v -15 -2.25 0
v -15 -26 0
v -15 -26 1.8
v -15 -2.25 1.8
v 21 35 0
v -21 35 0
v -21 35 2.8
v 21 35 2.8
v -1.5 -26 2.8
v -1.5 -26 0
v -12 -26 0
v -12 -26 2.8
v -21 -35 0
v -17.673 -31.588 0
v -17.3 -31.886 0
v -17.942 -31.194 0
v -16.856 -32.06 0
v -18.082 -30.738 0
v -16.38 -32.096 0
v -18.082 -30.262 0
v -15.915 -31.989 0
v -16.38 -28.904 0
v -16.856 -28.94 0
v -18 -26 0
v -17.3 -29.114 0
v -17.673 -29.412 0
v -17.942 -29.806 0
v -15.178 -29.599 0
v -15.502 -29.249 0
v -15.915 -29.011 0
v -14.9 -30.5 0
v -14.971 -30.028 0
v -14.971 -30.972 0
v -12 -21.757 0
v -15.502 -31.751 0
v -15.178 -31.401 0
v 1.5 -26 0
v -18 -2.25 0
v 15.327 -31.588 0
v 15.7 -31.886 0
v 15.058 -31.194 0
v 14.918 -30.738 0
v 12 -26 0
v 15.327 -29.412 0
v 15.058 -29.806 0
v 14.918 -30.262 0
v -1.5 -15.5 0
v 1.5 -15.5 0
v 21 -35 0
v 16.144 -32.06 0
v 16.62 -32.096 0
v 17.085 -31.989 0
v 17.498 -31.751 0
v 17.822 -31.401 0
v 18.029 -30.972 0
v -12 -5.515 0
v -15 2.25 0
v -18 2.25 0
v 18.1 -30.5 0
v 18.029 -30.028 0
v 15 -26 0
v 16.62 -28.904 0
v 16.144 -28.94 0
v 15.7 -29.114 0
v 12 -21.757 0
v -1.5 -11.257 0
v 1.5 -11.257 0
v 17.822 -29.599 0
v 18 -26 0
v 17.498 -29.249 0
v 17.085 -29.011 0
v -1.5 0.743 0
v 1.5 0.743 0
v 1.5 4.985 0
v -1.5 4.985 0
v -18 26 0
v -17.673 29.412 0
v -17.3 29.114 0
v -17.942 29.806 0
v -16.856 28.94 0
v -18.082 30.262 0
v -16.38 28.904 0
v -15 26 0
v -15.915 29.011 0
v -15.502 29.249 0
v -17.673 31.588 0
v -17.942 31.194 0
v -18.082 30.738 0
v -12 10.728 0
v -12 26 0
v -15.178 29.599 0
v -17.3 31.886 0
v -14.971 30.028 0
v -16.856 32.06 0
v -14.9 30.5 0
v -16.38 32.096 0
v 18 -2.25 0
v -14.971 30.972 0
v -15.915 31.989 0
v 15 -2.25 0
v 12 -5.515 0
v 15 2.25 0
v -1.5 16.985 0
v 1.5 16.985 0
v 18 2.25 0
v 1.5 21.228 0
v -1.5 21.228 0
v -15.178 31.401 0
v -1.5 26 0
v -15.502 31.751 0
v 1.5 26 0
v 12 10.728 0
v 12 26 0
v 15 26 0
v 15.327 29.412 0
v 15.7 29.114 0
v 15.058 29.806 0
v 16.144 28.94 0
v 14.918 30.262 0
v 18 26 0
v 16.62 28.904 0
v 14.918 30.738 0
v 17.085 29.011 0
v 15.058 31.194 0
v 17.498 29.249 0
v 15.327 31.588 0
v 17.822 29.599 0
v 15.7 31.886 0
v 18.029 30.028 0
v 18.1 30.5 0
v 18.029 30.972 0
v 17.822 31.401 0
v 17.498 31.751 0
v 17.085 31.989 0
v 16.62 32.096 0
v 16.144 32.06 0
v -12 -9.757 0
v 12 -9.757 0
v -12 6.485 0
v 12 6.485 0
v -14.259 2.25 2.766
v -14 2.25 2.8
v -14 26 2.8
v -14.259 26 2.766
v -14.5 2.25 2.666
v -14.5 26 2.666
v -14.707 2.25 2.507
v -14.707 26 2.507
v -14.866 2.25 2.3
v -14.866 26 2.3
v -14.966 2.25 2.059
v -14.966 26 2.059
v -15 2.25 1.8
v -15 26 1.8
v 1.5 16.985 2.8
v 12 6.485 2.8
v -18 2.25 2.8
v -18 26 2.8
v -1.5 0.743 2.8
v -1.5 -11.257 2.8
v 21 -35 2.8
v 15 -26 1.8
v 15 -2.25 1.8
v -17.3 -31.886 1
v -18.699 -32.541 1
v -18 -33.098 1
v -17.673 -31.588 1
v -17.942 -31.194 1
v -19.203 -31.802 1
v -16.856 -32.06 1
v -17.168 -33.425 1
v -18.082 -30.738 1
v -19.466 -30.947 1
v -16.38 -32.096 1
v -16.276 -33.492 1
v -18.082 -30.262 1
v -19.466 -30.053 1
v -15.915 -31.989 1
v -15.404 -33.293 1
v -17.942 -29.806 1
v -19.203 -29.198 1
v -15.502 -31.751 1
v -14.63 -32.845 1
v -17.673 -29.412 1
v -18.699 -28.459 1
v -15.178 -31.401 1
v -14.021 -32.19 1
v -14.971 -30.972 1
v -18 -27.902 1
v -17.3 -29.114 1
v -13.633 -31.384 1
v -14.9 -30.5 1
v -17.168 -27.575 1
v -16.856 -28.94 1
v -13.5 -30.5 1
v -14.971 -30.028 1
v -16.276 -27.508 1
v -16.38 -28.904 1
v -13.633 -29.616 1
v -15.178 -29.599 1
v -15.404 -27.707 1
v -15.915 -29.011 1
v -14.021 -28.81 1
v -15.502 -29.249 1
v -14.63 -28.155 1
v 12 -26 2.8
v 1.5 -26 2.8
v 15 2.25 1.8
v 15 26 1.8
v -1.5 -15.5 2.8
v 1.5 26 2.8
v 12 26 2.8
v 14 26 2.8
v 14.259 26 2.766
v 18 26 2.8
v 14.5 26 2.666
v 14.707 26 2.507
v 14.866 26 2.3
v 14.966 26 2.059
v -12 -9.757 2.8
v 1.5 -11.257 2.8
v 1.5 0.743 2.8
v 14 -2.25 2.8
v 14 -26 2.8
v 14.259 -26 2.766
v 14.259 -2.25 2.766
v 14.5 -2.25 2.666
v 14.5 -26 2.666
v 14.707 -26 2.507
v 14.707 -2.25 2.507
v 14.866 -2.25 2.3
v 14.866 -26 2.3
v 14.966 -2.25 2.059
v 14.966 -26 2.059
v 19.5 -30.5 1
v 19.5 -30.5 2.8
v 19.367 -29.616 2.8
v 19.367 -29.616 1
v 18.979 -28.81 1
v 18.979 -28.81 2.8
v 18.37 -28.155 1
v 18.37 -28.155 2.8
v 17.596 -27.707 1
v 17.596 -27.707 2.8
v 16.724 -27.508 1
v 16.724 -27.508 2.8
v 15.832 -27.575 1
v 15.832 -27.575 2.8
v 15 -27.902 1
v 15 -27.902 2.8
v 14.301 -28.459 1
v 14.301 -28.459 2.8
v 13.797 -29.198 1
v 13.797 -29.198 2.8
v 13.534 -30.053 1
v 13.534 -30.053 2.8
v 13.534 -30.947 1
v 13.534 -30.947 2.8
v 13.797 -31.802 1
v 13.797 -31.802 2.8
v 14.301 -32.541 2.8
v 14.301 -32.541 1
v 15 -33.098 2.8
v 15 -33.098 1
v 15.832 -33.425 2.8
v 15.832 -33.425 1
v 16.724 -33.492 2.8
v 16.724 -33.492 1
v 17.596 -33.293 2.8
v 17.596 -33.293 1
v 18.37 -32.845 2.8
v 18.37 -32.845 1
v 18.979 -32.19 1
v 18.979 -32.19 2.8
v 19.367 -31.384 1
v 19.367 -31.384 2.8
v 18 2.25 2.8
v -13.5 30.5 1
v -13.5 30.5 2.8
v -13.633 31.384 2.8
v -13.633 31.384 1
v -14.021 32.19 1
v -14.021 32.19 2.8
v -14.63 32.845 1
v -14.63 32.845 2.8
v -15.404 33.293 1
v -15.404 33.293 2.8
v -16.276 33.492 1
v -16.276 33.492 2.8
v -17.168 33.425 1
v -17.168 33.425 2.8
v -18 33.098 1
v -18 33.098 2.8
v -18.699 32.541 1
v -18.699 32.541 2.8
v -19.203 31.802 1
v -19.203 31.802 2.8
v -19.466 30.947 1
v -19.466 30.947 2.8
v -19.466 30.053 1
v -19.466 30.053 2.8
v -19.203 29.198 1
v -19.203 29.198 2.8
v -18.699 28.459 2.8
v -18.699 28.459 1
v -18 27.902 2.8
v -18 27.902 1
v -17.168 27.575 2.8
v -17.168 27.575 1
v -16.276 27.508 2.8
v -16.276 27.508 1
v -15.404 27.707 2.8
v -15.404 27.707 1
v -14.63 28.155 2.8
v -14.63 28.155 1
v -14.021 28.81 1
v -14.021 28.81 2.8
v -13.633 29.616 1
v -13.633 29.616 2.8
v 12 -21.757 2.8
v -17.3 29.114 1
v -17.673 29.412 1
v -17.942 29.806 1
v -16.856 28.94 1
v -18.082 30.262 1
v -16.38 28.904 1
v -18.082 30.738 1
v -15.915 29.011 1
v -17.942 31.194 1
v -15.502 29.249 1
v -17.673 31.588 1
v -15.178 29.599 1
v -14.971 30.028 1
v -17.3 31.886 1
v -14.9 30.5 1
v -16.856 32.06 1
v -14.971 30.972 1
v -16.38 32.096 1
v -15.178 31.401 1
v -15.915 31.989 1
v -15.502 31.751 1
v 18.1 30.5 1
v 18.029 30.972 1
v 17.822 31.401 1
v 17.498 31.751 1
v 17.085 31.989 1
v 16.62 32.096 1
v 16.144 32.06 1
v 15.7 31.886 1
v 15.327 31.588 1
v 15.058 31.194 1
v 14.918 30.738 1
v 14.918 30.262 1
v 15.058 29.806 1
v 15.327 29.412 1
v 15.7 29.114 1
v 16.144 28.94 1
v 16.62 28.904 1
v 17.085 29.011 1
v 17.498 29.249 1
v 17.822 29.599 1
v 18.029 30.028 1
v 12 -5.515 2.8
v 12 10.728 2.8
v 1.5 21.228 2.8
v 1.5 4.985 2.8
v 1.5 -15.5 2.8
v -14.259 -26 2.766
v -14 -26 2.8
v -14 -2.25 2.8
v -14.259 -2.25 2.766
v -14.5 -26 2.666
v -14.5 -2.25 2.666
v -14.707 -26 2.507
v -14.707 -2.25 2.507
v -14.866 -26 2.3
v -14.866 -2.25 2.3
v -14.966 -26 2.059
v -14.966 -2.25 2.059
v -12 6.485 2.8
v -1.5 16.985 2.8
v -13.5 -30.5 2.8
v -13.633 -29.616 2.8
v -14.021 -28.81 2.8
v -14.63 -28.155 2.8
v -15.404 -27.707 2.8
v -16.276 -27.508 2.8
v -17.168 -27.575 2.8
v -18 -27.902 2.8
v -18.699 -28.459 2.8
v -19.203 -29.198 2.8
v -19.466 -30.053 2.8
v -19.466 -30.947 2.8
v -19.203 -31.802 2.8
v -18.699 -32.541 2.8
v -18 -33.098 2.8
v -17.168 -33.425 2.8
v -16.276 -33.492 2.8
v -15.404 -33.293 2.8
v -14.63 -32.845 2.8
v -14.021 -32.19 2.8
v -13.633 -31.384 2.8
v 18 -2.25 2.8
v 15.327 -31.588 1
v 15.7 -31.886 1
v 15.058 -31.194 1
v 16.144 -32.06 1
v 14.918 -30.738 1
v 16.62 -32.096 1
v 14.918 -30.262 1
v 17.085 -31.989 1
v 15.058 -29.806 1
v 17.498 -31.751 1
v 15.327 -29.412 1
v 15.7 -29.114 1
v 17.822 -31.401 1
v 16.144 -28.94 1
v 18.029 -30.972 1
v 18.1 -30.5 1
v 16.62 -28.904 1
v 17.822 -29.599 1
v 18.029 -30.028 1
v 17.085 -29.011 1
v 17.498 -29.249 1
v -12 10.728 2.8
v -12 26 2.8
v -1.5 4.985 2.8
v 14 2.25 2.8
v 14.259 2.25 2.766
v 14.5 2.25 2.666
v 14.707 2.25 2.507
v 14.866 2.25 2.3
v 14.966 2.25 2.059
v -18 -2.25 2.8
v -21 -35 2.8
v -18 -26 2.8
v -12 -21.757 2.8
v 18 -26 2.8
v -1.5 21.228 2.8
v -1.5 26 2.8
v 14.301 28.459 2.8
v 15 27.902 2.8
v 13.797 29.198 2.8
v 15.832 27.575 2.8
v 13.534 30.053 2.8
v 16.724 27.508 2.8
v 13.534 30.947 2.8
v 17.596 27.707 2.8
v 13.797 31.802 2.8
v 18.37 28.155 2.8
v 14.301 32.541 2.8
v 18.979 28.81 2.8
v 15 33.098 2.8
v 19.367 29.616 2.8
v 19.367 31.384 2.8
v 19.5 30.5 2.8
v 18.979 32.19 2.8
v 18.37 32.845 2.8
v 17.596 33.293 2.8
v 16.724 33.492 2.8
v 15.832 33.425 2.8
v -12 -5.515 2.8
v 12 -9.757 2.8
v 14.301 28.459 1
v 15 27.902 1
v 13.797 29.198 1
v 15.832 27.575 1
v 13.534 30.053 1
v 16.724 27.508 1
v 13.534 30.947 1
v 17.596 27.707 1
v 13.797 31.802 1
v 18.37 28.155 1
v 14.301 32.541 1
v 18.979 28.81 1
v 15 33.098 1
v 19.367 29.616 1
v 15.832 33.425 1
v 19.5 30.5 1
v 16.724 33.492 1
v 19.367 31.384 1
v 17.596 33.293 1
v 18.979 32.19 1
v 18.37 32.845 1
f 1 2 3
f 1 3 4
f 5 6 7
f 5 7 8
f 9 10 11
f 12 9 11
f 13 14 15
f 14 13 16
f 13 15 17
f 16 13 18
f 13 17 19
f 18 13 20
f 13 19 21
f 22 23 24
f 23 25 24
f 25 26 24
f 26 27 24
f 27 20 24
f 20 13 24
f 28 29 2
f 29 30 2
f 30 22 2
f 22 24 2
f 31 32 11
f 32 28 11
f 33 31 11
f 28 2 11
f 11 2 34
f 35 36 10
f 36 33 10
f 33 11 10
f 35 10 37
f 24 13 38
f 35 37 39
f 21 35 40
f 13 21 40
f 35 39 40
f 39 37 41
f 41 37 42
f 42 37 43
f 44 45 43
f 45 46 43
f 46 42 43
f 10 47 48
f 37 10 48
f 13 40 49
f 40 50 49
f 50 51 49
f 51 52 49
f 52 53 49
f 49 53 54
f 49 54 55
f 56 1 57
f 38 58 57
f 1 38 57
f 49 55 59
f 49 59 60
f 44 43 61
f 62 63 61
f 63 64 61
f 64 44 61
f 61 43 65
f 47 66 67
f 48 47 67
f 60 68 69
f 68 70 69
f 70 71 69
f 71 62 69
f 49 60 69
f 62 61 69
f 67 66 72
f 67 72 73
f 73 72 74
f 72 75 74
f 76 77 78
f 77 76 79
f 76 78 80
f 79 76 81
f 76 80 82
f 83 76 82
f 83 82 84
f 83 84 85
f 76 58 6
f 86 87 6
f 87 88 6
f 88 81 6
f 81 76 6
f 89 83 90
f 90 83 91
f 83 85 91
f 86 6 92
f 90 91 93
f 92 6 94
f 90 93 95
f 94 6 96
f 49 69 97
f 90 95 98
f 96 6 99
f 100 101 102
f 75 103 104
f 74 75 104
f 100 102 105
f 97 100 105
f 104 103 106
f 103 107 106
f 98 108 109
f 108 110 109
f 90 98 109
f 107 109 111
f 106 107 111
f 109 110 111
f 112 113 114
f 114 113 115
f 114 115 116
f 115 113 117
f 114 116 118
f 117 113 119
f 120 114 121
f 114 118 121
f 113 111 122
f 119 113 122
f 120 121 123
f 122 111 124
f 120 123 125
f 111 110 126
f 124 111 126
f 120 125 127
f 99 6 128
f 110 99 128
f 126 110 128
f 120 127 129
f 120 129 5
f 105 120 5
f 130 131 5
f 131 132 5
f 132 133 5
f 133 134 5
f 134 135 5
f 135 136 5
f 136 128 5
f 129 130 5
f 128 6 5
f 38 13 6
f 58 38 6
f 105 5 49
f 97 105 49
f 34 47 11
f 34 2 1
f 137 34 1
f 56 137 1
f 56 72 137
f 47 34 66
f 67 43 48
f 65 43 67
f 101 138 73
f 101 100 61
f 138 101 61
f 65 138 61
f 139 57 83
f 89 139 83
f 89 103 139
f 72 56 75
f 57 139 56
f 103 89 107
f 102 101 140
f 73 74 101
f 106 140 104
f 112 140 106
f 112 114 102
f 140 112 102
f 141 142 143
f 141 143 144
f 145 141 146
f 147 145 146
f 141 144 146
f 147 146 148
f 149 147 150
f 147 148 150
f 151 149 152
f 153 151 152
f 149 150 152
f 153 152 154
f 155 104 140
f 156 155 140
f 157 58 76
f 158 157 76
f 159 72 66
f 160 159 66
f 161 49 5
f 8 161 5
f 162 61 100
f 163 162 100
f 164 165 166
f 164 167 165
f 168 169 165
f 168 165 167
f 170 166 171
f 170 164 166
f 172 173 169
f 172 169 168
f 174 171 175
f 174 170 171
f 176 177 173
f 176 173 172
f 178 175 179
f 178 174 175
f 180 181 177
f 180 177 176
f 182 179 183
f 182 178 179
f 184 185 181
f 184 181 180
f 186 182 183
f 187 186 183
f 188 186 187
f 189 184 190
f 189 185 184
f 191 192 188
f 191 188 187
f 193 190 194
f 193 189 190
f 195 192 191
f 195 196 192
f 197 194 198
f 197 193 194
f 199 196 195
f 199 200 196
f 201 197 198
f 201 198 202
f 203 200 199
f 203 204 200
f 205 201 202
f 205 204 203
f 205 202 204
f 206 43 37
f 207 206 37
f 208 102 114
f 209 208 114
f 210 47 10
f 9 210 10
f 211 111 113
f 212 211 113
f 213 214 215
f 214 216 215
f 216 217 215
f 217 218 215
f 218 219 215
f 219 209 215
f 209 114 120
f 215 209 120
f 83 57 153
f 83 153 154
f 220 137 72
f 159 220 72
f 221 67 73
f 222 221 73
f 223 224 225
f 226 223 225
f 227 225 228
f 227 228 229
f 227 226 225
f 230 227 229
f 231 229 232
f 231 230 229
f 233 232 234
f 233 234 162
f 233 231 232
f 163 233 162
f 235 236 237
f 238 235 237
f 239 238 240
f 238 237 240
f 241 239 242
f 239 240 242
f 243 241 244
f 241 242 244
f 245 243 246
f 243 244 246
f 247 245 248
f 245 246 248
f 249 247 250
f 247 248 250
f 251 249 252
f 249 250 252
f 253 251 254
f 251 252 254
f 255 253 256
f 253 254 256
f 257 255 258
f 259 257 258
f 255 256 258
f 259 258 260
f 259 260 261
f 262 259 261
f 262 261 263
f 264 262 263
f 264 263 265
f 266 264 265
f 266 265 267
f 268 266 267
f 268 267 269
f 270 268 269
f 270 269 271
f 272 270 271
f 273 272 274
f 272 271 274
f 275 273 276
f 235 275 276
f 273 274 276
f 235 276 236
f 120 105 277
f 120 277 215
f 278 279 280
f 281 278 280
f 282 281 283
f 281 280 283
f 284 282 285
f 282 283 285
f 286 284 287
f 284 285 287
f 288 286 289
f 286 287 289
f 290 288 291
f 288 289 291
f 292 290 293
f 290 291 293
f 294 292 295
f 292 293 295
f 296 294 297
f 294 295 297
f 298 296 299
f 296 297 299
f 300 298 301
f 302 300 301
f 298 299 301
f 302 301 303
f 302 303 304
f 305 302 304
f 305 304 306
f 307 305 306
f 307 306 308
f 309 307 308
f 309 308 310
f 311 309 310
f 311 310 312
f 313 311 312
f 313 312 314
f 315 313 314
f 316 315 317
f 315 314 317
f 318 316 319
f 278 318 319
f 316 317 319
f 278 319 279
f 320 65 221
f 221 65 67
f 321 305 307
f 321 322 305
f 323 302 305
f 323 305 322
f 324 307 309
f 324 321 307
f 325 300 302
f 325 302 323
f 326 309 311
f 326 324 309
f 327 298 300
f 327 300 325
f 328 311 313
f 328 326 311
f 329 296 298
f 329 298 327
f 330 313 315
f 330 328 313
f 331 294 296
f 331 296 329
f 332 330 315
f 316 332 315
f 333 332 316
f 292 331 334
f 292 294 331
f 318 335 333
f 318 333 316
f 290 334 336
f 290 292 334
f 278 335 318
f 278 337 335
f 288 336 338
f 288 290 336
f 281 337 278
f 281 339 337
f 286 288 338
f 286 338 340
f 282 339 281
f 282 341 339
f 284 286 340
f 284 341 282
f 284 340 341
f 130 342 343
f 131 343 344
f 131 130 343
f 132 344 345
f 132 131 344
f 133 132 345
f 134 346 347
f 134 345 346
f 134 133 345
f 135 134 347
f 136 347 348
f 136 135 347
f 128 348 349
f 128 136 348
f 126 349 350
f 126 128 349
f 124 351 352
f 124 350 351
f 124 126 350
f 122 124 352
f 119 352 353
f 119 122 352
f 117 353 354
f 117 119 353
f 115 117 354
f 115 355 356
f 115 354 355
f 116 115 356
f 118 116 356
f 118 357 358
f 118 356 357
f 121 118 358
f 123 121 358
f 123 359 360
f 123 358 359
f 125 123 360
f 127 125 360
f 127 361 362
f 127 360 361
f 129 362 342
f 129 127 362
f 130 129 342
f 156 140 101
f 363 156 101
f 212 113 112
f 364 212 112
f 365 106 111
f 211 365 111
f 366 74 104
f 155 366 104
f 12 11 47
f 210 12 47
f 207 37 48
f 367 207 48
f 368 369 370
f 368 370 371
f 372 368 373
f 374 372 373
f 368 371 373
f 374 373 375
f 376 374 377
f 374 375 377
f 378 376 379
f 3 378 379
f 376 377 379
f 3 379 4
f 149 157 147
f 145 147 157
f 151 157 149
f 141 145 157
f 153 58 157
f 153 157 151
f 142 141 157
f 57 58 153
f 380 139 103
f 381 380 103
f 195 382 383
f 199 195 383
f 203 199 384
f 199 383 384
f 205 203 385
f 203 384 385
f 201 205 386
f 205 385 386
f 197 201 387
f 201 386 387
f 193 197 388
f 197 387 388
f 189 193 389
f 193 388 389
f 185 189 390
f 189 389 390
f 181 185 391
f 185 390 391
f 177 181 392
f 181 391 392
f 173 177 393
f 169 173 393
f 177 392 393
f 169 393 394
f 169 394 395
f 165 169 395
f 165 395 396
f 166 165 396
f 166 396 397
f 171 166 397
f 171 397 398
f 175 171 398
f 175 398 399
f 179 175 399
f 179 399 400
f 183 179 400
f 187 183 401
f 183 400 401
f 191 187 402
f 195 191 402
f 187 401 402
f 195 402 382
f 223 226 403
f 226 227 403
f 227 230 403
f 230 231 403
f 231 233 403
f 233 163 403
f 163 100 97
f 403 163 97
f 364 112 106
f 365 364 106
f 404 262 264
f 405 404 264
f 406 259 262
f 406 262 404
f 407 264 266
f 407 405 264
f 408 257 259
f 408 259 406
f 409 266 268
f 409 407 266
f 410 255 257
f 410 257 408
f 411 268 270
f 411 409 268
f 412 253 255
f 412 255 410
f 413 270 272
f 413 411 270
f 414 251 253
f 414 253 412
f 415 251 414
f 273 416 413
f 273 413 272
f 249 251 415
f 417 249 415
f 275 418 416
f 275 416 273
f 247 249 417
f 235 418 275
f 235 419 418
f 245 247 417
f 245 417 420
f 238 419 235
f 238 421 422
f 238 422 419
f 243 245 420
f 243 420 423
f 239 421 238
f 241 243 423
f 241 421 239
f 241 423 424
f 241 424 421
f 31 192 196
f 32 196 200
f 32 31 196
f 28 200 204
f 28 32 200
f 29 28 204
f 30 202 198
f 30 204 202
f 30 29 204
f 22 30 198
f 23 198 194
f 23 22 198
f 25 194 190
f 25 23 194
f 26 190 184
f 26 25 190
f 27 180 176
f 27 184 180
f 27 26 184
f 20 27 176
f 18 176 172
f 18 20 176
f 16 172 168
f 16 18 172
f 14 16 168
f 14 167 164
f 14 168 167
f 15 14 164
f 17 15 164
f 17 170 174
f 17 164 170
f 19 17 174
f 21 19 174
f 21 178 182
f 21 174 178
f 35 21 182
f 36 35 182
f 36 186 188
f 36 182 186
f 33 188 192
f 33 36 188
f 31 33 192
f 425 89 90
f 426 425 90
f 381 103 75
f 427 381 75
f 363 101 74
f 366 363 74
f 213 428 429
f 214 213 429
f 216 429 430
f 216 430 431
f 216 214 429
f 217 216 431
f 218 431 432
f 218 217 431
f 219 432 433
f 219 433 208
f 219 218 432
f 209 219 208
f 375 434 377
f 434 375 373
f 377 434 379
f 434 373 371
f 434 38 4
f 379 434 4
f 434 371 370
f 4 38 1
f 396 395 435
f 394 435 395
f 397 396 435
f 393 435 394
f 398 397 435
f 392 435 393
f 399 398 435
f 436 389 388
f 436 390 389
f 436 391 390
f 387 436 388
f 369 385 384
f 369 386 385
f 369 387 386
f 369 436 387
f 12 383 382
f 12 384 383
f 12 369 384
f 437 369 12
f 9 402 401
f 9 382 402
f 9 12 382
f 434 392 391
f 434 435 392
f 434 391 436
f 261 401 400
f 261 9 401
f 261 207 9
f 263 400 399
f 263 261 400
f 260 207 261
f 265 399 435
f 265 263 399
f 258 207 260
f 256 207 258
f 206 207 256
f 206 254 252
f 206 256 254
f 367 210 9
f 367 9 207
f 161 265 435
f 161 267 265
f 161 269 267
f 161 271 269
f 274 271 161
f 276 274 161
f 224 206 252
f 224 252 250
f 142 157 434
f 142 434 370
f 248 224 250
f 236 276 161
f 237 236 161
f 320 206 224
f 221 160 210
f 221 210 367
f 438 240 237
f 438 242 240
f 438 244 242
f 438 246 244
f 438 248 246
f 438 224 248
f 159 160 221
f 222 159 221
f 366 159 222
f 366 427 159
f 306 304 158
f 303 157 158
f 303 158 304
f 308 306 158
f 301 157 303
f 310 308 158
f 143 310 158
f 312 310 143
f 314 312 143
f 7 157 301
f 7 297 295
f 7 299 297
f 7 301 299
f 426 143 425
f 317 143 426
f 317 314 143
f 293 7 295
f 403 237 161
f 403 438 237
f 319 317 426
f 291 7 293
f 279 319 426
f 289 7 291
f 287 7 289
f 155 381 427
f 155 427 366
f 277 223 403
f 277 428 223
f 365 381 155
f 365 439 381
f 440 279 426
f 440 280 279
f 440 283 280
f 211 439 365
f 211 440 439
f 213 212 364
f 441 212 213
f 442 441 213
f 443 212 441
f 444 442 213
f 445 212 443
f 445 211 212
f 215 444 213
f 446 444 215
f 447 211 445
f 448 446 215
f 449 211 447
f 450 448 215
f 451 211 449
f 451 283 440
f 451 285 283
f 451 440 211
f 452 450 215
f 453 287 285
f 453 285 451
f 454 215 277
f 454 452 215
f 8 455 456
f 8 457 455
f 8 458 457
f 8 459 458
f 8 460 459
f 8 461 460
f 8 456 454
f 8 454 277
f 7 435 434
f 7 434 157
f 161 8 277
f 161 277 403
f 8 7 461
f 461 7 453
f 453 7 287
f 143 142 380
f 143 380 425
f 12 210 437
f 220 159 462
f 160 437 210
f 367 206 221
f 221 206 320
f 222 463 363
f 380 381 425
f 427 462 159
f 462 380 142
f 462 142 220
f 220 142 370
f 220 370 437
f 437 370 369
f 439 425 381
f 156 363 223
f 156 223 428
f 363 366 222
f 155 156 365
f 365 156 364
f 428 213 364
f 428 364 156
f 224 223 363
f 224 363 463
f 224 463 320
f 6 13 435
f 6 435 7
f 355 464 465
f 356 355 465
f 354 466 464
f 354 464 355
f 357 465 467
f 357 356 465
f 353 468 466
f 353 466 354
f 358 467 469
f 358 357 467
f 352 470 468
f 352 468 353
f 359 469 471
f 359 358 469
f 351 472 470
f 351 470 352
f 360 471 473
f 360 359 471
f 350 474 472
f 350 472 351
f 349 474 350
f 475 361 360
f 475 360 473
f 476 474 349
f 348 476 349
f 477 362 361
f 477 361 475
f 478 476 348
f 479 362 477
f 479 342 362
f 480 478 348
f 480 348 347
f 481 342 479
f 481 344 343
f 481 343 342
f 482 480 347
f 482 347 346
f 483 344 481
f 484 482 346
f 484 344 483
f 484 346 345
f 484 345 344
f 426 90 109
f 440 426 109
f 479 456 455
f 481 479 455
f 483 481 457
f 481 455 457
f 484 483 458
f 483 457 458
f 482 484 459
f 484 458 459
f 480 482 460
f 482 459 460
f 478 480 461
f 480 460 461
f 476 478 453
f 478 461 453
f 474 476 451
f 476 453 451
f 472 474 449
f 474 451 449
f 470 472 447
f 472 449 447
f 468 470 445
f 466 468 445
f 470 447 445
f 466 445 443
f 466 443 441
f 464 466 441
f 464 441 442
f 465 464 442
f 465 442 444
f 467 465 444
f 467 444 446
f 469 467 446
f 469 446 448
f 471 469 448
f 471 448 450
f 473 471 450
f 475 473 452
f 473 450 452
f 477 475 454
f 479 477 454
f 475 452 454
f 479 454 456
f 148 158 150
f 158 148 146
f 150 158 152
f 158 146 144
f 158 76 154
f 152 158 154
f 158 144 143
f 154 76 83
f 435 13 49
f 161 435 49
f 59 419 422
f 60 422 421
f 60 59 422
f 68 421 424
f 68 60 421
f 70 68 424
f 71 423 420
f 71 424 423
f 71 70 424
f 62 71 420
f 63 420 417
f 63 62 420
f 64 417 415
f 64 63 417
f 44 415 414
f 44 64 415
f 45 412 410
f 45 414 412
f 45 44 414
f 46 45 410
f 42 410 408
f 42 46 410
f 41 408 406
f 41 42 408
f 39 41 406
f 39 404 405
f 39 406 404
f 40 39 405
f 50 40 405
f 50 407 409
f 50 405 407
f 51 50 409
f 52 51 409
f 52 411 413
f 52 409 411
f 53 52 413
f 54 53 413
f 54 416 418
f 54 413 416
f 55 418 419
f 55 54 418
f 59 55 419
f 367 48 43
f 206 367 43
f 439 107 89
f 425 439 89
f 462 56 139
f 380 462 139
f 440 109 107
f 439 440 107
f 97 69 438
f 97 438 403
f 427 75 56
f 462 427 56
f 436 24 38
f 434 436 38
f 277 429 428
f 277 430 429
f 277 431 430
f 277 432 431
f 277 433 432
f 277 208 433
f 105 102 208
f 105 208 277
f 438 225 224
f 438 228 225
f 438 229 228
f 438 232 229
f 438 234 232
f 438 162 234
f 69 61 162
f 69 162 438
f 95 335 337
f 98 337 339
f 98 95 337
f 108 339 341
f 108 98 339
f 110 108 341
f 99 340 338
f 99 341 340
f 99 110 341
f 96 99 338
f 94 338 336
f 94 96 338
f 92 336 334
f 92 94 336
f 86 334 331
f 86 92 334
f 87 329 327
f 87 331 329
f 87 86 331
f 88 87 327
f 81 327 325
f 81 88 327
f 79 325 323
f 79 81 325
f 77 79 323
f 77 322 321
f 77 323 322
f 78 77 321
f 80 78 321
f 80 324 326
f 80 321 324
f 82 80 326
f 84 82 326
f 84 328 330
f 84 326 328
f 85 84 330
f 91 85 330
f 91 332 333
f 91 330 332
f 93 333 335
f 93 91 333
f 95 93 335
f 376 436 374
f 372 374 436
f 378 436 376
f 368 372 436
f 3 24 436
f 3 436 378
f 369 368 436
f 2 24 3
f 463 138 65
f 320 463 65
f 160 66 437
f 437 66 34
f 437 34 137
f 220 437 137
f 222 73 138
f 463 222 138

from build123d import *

# Parameters (mm, degrees)
F1_W     = 42
F1_H     = 70
F1_R     = 1.6
F1_W_2   = 3
F1_H_2   = 23.75
F2_DEPTH = 2.8
F3_R     = 3
F4_DEPTH = 1.8
F5_R     = 1


with BuildPart() as f2:
    # F1 (on face) → F2 (new body)
    with BuildSketch(Plane.XY):
        Rectangle(F1_W, F1_H)
        with Locations((-16.5, -30.5)):
            Circle(F1_R, mode=Mode.SUBTRACT)
        Polygon((-12, -26), (-1.5, -15.5), (-1.5, -26), align=None, mode=Mode.SUBTRACT)
        with Locations((-16.5, -14.125)):
            Rectangle(F1_W_2, F1_H_2, mode=Mode.SUBTRACT)
        Polygon((-1.5, 0.742641), (-1.5, -11.257359), (-12, -21.757359), (-12, -9.757359), align=None, mode=Mode.SUBTRACT)
        Polygon((1.5, -26), (1.5, -15.5), (12, -26), align=None, mode=Mode.SUBTRACT)
        with Locations((16.5, -30.5)):
            Circle(F1_R, mode=Mode.SUBTRACT)
        Polygon((12, -21.757359), (1.5, -11.257359), (1.5, 0.742641), (12, -9.757359), align=None, mode=Mode.SUBTRACT)
        with Locations((16.5, -14.125)):
            Rectangle(F1_W_2, F1_H_2, mode=Mode.SUBTRACT)
        with Locations((-16.5, 14.125)):
            Rectangle(F1_W_2, F1_H_2, mode=Mode.SUBTRACT)
        Polygon((-1.5, 16.985281), (-1.5, 4.985281), (-12, -5.514719), (-12, 6.485281), align=None, mode=Mode.SUBTRACT)
        with Locations((-16.5, 30.5)):
            Circle(F1_R, mode=Mode.SUBTRACT)
        Polygon((-12, 10.727922), (-12, 26), (-1.5, 26), (-1.5, 21.227922), align=None, mode=Mode.SUBTRACT)
        Polygon((12, -5.514719), (1.5, 4.985281), (1.5, 16.985281), (12, 6.485281), align=None, mode=Mode.SUBTRACT)
        with Locations((16.5, 14.125)):
            Rectangle(F1_W_2, F1_H_2, mode=Mode.SUBTRACT)
        Polygon((1.5, 26), (12, 26), (12, 10.727922), (1.5, 21.227922), align=None, mode=Mode.SUBTRACT)
        with Locations((16.5, 30.5)):
            Circle(F1_R, mode=Mode.SUBTRACT)
    extrude(amount=F2_DEPTH)

    # F3 (on face) → F4 (cut)
    with BuildSketch(Plane.XY.offset(2.8)):
        with Locations((-16.5, -30.5)):
            Circle(F3_R)
        with Locations((16.5, -30.5)):
            Circle(F3_R)
        with Locations((-16.5, 30.5)):
            Circle(F3_R)
        with Locations((16.5, 30.5)):
            Circle(F3_R)
    extrude(amount=-F4_DEPTH, mode=Mode.SUBTRACT)

    # F5
    f5_edges = [f2.edges().sort_by_distance(p)[0] for p in [
        (-15, 14.125, 2.8),
        (15, 14.125, 2.8),
        (-15, -14.125, 2.8),
        (15, -14.125, 2.8),
    ]]
    fillet(f5_edges, radius=F5_R)


solid = f2.part
